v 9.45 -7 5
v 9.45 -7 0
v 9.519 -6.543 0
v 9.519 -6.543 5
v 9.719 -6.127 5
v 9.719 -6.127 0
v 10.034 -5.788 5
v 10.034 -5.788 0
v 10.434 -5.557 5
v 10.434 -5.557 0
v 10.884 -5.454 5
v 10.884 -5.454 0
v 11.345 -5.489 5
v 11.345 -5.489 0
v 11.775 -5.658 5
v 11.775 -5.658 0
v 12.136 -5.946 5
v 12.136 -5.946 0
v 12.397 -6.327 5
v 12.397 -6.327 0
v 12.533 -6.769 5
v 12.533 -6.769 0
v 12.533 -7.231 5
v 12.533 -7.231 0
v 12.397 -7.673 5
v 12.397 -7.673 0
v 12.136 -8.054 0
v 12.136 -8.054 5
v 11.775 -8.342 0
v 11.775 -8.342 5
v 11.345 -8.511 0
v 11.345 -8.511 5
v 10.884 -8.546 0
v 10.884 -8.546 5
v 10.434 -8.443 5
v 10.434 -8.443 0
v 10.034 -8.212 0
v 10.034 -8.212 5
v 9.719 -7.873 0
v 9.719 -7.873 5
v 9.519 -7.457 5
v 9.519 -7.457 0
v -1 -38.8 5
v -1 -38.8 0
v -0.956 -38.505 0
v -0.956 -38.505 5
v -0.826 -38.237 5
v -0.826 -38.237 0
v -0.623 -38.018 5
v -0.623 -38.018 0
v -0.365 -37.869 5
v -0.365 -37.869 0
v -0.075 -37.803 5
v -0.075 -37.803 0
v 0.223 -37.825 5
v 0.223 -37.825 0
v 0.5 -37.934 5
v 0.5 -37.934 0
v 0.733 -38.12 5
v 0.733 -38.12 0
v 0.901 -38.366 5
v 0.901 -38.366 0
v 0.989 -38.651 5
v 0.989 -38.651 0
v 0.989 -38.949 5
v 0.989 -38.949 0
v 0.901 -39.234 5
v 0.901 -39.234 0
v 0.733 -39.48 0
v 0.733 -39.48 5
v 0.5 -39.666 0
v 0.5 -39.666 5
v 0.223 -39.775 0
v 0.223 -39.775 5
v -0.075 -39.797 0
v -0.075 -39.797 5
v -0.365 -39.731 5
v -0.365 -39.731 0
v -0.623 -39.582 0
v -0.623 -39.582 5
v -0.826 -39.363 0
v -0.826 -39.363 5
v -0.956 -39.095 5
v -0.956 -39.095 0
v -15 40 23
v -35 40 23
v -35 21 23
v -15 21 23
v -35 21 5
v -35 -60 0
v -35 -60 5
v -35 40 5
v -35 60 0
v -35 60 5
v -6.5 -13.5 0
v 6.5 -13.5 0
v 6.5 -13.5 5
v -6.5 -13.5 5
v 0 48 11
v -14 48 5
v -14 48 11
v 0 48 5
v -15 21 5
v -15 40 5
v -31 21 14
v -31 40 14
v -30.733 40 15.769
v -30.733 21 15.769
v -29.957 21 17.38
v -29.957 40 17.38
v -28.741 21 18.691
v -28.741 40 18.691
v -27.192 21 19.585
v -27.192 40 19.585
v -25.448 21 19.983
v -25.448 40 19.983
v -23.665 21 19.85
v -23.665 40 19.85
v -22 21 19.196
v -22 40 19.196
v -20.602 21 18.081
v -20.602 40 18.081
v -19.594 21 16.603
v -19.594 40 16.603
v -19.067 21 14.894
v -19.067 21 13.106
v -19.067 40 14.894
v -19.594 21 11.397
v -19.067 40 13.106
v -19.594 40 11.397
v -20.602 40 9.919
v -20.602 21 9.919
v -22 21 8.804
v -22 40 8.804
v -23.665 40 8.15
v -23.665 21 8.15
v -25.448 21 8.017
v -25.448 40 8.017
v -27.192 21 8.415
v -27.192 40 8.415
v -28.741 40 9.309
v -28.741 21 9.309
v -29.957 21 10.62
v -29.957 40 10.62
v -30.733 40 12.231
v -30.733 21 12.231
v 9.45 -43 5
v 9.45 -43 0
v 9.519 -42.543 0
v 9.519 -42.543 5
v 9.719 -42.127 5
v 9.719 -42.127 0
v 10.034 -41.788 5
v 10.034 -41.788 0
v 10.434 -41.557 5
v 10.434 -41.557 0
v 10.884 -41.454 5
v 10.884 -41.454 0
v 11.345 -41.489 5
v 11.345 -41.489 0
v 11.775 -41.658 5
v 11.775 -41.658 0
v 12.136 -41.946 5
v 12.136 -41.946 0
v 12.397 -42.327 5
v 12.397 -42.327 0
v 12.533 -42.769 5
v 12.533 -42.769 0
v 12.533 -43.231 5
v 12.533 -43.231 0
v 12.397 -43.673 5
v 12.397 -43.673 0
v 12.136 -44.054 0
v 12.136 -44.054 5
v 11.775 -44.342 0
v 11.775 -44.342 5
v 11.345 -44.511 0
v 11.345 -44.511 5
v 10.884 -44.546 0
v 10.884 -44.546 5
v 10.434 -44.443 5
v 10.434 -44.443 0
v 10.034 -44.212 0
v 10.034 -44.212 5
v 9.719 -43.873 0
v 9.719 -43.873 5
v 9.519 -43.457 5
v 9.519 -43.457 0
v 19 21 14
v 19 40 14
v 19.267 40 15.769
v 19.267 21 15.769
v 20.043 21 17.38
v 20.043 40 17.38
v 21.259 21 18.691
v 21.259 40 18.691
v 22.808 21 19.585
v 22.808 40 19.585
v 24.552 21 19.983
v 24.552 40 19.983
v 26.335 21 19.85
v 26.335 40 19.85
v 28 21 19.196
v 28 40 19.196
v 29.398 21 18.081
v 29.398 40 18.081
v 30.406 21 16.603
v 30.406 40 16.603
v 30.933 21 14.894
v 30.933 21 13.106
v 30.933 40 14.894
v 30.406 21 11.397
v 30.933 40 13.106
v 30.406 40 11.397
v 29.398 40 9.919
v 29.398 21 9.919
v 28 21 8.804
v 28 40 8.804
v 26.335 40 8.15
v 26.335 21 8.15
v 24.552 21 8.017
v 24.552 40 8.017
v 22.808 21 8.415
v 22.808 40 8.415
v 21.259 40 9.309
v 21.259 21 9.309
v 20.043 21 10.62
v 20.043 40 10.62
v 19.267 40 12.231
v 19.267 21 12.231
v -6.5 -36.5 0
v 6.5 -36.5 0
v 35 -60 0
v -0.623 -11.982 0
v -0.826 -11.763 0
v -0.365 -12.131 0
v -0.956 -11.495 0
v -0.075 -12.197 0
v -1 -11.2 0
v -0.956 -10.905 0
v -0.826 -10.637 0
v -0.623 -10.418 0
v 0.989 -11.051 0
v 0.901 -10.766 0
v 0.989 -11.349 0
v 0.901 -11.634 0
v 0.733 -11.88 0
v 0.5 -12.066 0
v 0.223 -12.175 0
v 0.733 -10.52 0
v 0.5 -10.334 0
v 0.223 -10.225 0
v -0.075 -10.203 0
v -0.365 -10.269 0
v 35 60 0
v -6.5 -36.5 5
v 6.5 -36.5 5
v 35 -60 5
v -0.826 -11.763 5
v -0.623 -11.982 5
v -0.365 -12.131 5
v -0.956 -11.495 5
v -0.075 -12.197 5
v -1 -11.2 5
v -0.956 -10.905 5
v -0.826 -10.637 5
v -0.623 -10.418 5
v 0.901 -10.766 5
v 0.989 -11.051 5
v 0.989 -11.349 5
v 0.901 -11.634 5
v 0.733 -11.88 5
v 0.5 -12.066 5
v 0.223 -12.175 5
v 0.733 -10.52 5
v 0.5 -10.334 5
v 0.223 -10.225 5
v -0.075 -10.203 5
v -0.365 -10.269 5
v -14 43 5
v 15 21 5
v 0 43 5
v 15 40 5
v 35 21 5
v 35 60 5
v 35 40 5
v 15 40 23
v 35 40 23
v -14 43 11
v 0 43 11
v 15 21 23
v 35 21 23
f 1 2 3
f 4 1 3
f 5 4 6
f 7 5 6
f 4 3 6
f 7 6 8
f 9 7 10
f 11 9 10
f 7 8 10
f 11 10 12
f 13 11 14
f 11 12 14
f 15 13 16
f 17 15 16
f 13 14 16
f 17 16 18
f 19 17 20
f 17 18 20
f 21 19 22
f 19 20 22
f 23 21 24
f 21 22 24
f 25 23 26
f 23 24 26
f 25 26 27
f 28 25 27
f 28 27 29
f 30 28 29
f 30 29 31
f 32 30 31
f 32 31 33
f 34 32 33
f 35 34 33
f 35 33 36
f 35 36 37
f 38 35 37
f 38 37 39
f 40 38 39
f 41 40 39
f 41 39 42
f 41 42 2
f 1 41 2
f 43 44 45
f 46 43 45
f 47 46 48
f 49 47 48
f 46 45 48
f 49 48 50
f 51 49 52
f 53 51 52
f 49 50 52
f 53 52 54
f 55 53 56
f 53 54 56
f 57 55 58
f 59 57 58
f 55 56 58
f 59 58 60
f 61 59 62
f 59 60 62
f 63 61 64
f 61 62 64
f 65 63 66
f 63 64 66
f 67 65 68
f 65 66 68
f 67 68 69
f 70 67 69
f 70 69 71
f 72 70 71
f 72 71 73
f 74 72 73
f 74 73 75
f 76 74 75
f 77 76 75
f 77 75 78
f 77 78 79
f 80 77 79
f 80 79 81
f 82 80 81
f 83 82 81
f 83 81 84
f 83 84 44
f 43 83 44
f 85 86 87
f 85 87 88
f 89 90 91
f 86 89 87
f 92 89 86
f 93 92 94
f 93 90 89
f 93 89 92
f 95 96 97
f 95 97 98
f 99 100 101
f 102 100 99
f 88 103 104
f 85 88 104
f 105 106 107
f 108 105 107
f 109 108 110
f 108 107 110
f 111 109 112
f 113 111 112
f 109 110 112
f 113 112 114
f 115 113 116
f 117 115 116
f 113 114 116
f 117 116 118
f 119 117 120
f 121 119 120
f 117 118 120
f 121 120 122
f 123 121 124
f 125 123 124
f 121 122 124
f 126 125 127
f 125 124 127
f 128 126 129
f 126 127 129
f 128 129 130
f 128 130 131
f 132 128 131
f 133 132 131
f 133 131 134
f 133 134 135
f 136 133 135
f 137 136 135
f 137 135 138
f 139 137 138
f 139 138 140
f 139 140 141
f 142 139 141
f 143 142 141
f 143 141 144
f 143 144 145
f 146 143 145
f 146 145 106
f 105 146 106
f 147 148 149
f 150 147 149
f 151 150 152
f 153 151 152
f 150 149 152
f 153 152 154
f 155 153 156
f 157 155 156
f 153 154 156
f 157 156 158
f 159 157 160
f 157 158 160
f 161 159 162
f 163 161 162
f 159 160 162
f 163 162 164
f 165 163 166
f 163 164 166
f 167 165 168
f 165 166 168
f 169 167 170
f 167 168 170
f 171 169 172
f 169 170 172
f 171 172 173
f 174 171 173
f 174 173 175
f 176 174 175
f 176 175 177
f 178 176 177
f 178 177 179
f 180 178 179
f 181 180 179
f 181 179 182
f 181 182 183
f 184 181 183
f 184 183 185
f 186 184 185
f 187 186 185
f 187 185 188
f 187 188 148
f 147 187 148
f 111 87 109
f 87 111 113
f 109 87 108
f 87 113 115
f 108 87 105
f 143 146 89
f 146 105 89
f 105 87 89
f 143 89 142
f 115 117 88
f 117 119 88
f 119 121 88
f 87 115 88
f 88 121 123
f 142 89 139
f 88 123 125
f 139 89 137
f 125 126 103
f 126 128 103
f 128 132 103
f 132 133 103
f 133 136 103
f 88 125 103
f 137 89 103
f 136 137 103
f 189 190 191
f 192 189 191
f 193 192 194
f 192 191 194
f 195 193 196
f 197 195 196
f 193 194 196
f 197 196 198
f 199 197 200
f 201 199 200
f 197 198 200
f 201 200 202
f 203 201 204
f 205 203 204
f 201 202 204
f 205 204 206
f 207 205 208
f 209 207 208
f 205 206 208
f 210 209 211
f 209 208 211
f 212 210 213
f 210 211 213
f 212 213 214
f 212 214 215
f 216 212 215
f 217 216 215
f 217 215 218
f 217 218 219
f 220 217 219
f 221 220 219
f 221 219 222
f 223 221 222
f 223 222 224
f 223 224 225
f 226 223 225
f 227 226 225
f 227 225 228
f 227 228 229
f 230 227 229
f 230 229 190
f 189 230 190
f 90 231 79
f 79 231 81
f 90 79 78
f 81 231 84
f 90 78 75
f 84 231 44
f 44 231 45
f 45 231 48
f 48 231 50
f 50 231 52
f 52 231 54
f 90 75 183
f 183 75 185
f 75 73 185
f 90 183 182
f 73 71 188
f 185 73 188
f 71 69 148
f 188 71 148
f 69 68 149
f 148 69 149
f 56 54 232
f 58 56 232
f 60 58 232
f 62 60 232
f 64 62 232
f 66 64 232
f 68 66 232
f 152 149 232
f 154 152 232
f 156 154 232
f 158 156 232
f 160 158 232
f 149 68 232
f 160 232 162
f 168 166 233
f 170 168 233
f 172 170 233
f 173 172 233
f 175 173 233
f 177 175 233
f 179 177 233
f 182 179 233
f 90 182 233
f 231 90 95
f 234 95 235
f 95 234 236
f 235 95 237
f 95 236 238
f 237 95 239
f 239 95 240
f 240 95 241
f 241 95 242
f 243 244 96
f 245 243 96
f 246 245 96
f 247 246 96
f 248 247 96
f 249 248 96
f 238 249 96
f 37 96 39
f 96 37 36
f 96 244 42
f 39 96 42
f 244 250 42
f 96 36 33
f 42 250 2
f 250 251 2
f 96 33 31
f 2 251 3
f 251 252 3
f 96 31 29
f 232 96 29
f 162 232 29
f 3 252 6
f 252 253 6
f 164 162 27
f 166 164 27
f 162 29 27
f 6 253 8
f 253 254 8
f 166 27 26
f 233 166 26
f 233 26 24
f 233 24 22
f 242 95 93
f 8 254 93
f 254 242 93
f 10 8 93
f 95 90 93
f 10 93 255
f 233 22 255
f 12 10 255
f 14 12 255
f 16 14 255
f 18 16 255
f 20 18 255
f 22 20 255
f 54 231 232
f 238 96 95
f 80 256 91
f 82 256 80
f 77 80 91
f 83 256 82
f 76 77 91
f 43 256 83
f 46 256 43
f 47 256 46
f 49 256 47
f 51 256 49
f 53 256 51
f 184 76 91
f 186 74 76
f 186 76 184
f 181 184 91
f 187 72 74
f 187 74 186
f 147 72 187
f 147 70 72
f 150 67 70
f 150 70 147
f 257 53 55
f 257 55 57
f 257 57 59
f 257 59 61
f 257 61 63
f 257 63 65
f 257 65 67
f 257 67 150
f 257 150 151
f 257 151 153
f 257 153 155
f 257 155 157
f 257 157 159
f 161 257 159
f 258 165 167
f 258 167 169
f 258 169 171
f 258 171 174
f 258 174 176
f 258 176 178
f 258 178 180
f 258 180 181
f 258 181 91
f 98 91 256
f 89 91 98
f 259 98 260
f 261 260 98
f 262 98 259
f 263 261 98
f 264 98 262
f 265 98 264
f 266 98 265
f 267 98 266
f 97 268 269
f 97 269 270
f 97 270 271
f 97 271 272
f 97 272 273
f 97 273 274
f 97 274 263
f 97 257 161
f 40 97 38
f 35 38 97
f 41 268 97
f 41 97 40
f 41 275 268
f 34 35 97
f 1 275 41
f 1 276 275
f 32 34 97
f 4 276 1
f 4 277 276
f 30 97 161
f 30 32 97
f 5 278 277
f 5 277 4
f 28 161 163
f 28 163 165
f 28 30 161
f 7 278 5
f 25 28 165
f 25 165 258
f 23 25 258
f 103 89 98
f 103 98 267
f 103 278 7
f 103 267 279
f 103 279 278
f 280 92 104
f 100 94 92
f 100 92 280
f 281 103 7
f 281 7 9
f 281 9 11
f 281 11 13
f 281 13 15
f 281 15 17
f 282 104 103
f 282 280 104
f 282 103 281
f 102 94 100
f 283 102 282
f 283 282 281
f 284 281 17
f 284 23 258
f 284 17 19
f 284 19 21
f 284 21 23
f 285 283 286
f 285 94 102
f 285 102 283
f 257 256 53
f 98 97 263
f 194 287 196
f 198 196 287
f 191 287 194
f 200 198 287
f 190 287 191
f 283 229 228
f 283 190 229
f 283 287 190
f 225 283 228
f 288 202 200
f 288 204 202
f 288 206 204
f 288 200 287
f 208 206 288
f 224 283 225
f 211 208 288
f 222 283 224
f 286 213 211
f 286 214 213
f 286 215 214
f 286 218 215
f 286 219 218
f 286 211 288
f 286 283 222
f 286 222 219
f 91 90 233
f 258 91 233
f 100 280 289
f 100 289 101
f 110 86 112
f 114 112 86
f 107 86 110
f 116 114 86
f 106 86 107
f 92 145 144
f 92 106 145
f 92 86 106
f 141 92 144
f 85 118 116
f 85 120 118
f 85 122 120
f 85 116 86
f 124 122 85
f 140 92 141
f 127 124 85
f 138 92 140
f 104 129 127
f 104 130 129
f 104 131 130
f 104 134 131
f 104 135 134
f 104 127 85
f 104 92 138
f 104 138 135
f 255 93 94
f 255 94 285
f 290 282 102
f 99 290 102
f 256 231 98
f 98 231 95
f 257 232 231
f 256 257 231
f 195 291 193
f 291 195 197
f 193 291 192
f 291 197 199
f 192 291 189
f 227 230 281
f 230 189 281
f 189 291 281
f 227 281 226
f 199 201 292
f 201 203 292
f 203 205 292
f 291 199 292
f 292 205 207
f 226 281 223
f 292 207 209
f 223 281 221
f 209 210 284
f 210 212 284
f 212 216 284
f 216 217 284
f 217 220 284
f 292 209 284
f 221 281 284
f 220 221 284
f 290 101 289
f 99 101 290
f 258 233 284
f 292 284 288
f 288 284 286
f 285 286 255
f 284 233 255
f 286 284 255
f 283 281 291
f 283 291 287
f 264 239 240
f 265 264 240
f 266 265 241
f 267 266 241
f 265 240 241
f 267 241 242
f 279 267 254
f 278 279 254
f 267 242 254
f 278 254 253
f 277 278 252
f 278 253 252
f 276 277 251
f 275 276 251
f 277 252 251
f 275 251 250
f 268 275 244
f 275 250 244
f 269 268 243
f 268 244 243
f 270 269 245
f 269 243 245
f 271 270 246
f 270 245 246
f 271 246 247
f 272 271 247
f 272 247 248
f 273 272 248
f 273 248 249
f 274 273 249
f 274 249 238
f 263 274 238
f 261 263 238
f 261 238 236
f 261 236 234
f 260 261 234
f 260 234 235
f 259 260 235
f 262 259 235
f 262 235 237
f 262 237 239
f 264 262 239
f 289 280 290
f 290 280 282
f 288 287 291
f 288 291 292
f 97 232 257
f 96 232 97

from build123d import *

# Parameters (mm, degrees)
SKETCH1_W           = 70
SKETCH1_H           = 120
BOSS_EXTRUDE1_DEPTH = 5
SKETCH2_W           = 20
SKETCH2_H           = 19
BOSS_EXTRUDE2_DEPTH = 18
SKETCH3_R           = 6
CUT_EXTRUDE1_DEPTH  = 109.415865998
CUT_EXTRUDE2_REACH  = 75.171
SKETCH4_R           = 1
SKETCH4_W           = 13
SKETCH4_H           = 23
SKETCH5_W           = 14
SKETCH5_H           = 5
BOSS_EXTRUDE3_DEPTH = 6
SKETCH6_R           = 1.55
CUT_EXTRUDE3_DEPTH  = 74.17103252


with BuildPart() as part:
    # Sketch1 → Boss-Extrude1 (new body)
    with BuildSketch(Plane.XY):
        Rectangle(SKETCH1_W, SKETCH1_H)
    extrude(amount=BOSS_EXTRUDE1_DEPTH)

    # Sketch2 → Boss-Extrude2 (add)
    with BuildSketch(Plane.XY.offset(5)):
        with Locations((-25, 30.5)):
            Rectangle(SKETCH2_W, SKETCH2_H)
        with Locations((25, 30.5)):
            Rectangle(SKETCH2_W, SKETCH2_H)
    extrude(amount=BOSS_EXTRUDE2_DEPTH)

    # Sketch3 → Cut-Extrude1 (cut, through all)
    with BuildSketch(Plane(origin=(0, 40, 0), x_dir=(1, 0, 0), z_dir=(0, 1, 0))):
        with Locations(Location((-25, -14, 0), (0, 0, 180))):
            Circle(SKETCH3_R)
        with Locations(Location((25, -14, 0), (0, 0, 180))):
            Circle(SKETCH3_R)
    extrude(amount=-CUT_EXTRUDE1_DEPTH, mode=Mode.SUBTRACT)

    # Sketch4 → Cut-Extrude2 (cut, up to next)
    with BuildSketch(Plane(origin=(0, 0, 0), x_dir=(-1, 0, 0), z_dir=(0, 0, -1)), mode=Mode.PRIVATE) as cut_extrude2_sk1:
        with Locations((0, -11.2)):
            Circle(SKETCH4_R)
    cut_extrude2_tool1 = extrude(cut_extrude2_sk1.sketch, amount=-CUT_EXTRUDE2_REACH, mode=Mode.PRIVATE) & part.part
    # Sketch4 → Cut-Extrude2 (cut, up to next)
    with BuildSketch(Plane(origin=(0, 0, 0), x_dir=(-1, 0, 0), z_dir=(0, 0, -1)), mode=Mode.PRIVATE) as cut_extrude2_sk2:
        with Locations((0, -38.8)):
            Circle(SKETCH4_R)
    cut_extrude2_tool2 = extrude(cut_extrude2_sk2.sketch, amount=-CUT_EXTRUDE2_REACH, mode=Mode.PRIVATE) & part.part
    # Sketch4 → Cut-Extrude2 (cut, up to next)
    with BuildSketch(Plane(origin=(0, 0, 0), x_dir=(-1, 0, 0), z_dir=(0, 0, -1)), mode=Mode.PRIVATE) as cut_extrude2_sk3:
        with Locations((0, -25)):
            Rectangle(SKETCH4_W, SKETCH4_H)
    cut_extrude2_tool3 = extrude(cut_extrude2_sk3.sketch, amount=-CUT_EXTRUDE2_REACH, mode=Mode.PRIVATE) & part.part
    add(cut_extrude2_tool1.solids().sort_by_distance((0, -11.2, 0))[0], mode=Mode.SUBTRACT)
    add(cut_extrude2_tool2.solids().sort_by_distance((0, -38.8, 0))[0], mode=Mode.SUBTRACT)
    add(cut_extrude2_tool3.solids().sort_by_distance((0, -25, 0))[0], mode=Mode.SUBTRACT)

    # Sketch5 → Boss-Extrude3 (add)
    with BuildSketch(Plane.XY.offset(5)):
        with Locations((-7, 45.5)):
            Rectangle(SKETCH5_W, SKETCH5_H)
    extrude(amount=BOSS_EXTRUDE3_DEPTH)

    # Sketch6 → Cut-Extrude3 (cut, through all)
    with BuildSketch(Plane(origin=(0, 0, 0), x_dir=(-1, 0, 0), z_dir=(0, 0, -1))):
        with Locations((-11, -7)):
            Circle(SKETCH6_R)
        with Locations((-11, -43)):
            Circle(SKETCH6_R)
    extrude(amount=-CUT_EXTRUDE3_DEPTH, mode=Mode.SUBTRACT)


solid = part.part
